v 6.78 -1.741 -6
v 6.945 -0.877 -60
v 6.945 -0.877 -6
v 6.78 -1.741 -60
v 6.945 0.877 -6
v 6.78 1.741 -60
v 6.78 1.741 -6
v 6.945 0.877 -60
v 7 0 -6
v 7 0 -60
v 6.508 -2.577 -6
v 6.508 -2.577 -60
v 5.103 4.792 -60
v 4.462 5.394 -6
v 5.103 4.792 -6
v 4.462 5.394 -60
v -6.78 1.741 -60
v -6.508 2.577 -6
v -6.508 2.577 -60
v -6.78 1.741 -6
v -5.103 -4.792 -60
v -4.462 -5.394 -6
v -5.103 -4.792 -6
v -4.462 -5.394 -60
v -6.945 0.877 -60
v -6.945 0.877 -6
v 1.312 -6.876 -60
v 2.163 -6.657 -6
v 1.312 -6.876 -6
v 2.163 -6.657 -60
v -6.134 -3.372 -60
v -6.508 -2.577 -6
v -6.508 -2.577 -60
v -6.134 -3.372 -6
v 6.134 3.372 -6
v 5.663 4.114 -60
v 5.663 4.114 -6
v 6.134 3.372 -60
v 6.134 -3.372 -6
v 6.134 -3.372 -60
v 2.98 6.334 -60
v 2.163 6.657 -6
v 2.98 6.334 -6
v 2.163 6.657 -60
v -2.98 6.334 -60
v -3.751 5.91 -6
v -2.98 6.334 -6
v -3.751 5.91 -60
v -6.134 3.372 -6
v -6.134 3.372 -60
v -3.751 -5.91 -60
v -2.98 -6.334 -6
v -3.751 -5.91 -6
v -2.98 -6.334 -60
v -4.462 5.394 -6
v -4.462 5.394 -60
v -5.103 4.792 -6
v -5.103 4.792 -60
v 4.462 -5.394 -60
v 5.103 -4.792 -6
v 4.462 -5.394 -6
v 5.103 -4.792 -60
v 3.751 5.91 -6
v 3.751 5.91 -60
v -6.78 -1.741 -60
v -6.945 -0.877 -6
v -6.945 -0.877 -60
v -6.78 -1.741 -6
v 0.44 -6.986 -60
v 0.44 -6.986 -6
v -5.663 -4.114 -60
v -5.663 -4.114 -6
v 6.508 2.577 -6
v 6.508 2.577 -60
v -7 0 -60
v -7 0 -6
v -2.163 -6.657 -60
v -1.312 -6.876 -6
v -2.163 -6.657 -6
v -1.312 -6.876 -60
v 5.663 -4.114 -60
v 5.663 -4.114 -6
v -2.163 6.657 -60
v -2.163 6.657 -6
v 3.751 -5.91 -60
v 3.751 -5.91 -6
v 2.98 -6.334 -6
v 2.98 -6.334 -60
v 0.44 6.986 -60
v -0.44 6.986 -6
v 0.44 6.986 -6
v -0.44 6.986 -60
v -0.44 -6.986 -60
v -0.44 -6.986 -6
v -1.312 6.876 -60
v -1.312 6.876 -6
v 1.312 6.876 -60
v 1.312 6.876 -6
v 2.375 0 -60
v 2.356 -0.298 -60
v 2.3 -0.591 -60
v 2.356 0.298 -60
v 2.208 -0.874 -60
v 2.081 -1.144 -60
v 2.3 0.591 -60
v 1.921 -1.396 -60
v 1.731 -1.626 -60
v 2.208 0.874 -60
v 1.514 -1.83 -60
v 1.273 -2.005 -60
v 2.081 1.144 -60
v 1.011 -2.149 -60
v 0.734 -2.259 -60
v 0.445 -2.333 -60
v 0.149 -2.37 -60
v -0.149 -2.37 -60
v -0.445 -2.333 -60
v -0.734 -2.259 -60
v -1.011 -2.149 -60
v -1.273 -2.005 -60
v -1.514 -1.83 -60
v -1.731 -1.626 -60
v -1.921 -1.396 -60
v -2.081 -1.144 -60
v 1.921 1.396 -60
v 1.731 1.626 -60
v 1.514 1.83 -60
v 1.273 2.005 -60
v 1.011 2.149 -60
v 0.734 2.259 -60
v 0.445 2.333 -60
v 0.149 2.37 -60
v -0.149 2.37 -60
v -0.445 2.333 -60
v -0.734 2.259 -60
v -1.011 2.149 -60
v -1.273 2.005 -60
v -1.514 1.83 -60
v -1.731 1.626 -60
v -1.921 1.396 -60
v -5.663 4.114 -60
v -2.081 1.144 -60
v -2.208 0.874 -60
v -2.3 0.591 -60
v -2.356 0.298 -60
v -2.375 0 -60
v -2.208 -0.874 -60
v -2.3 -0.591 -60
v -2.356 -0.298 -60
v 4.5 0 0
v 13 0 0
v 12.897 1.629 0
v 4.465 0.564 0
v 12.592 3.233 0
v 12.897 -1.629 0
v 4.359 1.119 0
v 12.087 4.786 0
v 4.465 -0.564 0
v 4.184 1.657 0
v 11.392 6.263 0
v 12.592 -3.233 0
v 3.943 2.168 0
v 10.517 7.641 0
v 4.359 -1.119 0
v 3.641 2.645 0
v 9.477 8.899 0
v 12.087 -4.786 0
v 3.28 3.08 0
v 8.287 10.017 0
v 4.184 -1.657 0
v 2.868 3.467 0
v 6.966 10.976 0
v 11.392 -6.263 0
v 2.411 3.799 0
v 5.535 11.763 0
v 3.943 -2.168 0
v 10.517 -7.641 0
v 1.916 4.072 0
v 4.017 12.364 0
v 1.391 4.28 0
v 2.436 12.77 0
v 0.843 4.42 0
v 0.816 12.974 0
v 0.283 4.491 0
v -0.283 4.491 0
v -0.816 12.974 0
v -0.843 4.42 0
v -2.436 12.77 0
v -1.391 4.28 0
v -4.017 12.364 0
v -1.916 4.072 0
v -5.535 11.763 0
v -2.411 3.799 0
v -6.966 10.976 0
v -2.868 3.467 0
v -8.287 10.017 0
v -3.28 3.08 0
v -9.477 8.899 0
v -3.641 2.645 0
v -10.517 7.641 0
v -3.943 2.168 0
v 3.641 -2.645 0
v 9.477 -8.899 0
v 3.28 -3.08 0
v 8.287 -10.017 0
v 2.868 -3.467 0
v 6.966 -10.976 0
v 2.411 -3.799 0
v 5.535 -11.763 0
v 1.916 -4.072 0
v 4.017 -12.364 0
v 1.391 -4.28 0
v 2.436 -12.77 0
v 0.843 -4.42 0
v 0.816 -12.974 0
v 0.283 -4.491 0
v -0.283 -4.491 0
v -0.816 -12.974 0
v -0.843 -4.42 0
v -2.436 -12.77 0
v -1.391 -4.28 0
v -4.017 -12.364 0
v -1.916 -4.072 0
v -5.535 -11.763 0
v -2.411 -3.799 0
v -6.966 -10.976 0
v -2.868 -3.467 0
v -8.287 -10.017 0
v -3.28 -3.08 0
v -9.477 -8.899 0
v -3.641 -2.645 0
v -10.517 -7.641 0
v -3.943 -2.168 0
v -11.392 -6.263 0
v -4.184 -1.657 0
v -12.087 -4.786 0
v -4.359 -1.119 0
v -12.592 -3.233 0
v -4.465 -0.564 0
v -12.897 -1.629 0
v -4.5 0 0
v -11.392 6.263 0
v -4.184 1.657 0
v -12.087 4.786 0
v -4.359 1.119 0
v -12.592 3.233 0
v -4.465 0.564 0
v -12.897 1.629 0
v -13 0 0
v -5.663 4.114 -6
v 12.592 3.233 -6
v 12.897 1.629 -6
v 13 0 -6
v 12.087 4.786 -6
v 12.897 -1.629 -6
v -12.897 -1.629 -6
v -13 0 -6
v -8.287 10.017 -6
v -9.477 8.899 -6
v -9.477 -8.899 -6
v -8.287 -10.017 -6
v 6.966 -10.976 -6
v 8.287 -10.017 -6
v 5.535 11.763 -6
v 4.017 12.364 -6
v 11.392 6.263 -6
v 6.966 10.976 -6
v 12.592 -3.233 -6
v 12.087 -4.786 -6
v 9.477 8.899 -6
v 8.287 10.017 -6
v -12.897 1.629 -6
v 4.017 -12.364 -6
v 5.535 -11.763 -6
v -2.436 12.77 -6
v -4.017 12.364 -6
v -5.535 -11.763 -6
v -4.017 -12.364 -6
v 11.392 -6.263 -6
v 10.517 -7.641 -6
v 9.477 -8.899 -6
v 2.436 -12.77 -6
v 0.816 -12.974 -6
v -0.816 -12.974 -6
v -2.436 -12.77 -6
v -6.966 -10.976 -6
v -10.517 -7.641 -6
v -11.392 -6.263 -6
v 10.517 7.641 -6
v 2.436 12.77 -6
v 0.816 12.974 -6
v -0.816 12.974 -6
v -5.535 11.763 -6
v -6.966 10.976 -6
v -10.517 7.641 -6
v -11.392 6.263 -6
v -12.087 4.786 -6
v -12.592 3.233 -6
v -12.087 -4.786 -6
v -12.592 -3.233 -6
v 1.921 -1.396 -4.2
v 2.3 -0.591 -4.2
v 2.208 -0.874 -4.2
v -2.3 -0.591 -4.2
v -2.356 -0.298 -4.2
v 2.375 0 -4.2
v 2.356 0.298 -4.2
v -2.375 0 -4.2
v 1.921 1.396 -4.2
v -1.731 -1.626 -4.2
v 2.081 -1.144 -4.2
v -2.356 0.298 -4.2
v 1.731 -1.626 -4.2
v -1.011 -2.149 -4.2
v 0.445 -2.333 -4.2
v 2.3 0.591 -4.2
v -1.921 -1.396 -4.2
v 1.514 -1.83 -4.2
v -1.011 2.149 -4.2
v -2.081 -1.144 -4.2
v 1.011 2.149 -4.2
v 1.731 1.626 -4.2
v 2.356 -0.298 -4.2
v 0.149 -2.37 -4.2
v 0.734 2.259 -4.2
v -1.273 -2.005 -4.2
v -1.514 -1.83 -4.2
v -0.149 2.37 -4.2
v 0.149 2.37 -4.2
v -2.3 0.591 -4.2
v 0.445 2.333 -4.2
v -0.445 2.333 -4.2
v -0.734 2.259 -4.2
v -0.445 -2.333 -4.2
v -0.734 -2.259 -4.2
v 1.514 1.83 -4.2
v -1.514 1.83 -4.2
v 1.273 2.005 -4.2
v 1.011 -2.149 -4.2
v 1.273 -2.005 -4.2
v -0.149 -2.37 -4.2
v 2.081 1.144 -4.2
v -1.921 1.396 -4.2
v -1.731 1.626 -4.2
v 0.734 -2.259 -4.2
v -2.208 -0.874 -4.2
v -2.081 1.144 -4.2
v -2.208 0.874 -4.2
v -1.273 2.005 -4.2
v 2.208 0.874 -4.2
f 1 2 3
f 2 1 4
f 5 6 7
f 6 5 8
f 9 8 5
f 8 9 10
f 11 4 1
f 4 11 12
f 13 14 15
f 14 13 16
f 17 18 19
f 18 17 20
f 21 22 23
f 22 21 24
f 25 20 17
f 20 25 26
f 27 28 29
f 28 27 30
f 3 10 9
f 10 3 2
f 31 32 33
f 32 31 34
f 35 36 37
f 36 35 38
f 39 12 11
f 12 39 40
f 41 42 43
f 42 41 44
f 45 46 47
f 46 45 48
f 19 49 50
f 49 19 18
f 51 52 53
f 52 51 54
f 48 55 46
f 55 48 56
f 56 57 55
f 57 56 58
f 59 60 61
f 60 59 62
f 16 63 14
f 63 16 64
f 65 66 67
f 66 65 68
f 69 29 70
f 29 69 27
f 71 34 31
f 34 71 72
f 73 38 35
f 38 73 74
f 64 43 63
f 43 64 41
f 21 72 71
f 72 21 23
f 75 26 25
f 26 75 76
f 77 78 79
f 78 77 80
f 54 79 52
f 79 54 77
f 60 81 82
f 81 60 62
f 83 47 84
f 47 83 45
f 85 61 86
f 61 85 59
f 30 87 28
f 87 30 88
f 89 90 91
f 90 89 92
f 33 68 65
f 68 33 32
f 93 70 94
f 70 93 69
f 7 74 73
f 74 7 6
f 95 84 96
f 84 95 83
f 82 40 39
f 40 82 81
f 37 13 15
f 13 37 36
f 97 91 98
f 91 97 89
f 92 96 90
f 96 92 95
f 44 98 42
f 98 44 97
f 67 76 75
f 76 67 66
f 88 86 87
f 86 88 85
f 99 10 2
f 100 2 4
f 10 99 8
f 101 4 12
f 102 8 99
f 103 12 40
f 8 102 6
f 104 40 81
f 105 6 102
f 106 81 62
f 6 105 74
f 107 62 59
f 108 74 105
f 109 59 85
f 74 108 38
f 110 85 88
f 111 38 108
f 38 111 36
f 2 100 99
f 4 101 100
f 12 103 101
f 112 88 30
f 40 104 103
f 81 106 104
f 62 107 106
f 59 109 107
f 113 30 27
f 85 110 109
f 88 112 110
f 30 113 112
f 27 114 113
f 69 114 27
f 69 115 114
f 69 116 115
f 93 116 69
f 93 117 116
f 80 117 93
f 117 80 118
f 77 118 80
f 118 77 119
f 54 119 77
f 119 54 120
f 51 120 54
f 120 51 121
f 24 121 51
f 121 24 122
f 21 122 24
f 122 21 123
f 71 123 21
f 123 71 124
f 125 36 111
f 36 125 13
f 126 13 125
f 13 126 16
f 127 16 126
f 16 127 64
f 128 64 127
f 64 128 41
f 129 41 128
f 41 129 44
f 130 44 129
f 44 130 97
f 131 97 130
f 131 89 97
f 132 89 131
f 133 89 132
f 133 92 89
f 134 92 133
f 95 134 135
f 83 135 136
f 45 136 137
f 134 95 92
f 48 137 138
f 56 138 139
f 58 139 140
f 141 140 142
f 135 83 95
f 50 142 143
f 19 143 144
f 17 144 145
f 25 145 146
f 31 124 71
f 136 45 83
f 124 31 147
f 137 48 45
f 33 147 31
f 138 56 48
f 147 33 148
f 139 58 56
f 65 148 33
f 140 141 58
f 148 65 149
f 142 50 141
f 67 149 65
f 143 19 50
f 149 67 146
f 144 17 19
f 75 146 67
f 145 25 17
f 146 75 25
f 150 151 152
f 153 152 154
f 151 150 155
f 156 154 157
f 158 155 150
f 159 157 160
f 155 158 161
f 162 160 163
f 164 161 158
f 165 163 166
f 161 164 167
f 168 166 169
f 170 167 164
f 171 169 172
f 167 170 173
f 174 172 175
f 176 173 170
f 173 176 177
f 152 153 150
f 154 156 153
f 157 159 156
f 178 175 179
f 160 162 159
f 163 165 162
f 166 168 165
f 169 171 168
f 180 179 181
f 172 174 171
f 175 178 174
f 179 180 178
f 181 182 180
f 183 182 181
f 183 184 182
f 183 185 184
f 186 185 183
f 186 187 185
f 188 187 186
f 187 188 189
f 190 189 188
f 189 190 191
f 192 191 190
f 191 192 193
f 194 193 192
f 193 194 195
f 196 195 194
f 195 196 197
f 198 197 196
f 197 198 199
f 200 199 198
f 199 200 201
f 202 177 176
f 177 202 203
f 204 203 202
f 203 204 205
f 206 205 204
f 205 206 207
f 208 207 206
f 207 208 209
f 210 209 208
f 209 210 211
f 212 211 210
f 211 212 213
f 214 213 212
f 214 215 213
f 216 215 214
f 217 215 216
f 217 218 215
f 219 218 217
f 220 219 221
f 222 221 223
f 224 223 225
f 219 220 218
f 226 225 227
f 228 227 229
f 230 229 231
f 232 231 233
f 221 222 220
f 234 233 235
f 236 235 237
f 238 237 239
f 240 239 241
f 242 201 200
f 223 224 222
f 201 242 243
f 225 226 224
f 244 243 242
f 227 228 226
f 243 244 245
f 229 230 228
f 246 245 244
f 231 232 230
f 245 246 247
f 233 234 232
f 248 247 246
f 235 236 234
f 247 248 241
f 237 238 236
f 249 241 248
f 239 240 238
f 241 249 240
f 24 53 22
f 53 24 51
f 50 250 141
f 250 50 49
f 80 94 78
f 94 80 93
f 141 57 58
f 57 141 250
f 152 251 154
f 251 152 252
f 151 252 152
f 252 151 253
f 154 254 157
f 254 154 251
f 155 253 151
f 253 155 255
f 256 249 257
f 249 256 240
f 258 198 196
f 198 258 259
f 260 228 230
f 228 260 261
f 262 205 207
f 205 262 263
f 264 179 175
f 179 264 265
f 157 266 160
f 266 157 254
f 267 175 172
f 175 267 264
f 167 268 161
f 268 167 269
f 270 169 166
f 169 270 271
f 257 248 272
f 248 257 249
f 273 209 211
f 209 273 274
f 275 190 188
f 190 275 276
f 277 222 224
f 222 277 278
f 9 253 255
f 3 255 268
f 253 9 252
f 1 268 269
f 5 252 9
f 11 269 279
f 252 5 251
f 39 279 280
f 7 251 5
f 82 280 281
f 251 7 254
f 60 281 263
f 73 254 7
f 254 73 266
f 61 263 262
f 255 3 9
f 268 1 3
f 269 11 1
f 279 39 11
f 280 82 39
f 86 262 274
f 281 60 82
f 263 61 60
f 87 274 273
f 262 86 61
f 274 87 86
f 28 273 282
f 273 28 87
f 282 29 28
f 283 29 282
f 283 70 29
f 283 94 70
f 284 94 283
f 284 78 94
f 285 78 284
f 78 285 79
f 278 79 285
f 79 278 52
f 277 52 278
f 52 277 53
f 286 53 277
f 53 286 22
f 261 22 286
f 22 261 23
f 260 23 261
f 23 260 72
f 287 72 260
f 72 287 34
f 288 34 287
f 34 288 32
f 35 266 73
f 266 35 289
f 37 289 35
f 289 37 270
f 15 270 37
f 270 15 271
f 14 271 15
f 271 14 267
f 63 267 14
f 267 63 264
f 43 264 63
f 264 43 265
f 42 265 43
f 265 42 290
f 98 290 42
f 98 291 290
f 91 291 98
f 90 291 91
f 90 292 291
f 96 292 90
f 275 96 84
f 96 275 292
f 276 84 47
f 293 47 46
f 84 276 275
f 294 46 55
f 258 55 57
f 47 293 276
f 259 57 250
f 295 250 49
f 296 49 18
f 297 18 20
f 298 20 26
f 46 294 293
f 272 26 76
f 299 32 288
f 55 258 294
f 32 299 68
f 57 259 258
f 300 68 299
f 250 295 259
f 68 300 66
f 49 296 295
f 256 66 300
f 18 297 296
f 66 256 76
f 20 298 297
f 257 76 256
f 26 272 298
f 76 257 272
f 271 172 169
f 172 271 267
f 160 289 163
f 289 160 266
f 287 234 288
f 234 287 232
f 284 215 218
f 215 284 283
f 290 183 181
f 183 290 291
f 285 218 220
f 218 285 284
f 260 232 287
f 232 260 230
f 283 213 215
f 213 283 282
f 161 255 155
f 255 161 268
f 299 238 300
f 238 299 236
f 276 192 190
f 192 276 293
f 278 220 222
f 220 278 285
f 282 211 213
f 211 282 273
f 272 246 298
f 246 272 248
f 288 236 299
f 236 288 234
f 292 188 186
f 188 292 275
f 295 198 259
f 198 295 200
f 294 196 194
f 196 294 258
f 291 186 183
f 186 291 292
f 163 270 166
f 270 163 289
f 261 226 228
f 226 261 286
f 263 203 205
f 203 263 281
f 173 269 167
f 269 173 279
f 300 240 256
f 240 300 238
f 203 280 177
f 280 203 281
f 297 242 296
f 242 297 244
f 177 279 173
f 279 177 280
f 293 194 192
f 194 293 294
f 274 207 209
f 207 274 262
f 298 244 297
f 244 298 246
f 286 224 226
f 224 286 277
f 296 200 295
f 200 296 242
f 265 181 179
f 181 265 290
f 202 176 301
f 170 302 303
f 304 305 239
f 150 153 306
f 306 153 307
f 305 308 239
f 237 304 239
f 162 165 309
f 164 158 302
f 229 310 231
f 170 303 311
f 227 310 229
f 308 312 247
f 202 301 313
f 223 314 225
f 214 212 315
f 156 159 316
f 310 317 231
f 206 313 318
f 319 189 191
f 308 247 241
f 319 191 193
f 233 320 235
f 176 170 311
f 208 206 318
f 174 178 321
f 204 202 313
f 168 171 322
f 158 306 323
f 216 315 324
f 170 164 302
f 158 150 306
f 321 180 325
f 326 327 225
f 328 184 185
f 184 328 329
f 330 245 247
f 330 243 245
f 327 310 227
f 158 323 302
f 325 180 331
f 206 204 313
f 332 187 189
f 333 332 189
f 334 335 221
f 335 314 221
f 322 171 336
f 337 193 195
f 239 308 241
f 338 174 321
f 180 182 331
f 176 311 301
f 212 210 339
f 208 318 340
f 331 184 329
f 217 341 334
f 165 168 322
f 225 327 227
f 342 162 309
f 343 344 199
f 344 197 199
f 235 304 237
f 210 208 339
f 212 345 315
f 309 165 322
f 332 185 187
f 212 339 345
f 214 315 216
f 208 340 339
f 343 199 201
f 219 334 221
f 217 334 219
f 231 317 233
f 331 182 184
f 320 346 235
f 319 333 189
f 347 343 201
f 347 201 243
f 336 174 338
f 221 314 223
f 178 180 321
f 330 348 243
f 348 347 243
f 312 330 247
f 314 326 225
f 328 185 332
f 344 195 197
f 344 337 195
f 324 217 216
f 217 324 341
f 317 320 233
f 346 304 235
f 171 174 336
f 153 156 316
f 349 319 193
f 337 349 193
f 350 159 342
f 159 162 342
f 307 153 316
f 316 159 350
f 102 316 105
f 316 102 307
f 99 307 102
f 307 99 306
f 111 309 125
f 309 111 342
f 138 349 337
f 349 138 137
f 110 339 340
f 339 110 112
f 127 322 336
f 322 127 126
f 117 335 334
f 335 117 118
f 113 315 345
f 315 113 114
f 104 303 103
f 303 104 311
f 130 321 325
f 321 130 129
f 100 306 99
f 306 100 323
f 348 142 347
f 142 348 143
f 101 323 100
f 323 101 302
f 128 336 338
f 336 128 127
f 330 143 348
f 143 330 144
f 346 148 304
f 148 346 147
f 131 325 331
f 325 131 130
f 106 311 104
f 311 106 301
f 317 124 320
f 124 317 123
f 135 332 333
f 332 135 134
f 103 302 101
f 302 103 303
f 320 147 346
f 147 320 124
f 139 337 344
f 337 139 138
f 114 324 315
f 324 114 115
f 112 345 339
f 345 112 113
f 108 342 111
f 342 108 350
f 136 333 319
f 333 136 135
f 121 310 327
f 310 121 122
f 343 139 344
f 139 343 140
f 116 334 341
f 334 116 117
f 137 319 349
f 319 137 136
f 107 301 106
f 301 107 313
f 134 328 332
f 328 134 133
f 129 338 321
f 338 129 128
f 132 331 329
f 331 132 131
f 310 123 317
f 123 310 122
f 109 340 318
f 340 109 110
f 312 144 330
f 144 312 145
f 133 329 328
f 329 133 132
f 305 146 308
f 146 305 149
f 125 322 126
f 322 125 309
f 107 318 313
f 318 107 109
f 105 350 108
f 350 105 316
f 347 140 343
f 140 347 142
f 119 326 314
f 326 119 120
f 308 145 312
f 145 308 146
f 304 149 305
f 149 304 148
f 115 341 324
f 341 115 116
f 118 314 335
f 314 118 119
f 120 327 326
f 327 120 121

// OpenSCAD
$fn = 50;


difference() {
	union() {
		translate(v = [0, 0, -60.0000000000]) {
			cylinder(h = 60, r = 7.0000000000);
		}
		translate(v = [0, 0, -6.0000000000]) {
			cylinder(h = 6, r = 13.0000000000);
		}
	}
	union() {
		translate(v = [0, 0, 0]) {
			rotate(a = [0, 0, 0]) {
				difference() {
					union() {
						#translate(v = [0, 0, -60.0000000000]) {
							cylinder(h = 60, r = 2.2500000000);
						}
						#translate(v = [0, 0, -4.2000000000]) {
							cylinder(h = 4.2000000000, r = 7.0000000000, r1 = 2.3750000000, r2 = 4.5000000000);
						}
						#translate(v = [0, 0, -60.0000000000]) {
							cylinder(h = 60, r = 2.3750000000);
						}
						#translate(v = [0, 0, -60.0000000000]) {
							cylinder(h = 60, r = 2.2500000000);
						}
					}
					union();
				}
			}
		}
	}
}
